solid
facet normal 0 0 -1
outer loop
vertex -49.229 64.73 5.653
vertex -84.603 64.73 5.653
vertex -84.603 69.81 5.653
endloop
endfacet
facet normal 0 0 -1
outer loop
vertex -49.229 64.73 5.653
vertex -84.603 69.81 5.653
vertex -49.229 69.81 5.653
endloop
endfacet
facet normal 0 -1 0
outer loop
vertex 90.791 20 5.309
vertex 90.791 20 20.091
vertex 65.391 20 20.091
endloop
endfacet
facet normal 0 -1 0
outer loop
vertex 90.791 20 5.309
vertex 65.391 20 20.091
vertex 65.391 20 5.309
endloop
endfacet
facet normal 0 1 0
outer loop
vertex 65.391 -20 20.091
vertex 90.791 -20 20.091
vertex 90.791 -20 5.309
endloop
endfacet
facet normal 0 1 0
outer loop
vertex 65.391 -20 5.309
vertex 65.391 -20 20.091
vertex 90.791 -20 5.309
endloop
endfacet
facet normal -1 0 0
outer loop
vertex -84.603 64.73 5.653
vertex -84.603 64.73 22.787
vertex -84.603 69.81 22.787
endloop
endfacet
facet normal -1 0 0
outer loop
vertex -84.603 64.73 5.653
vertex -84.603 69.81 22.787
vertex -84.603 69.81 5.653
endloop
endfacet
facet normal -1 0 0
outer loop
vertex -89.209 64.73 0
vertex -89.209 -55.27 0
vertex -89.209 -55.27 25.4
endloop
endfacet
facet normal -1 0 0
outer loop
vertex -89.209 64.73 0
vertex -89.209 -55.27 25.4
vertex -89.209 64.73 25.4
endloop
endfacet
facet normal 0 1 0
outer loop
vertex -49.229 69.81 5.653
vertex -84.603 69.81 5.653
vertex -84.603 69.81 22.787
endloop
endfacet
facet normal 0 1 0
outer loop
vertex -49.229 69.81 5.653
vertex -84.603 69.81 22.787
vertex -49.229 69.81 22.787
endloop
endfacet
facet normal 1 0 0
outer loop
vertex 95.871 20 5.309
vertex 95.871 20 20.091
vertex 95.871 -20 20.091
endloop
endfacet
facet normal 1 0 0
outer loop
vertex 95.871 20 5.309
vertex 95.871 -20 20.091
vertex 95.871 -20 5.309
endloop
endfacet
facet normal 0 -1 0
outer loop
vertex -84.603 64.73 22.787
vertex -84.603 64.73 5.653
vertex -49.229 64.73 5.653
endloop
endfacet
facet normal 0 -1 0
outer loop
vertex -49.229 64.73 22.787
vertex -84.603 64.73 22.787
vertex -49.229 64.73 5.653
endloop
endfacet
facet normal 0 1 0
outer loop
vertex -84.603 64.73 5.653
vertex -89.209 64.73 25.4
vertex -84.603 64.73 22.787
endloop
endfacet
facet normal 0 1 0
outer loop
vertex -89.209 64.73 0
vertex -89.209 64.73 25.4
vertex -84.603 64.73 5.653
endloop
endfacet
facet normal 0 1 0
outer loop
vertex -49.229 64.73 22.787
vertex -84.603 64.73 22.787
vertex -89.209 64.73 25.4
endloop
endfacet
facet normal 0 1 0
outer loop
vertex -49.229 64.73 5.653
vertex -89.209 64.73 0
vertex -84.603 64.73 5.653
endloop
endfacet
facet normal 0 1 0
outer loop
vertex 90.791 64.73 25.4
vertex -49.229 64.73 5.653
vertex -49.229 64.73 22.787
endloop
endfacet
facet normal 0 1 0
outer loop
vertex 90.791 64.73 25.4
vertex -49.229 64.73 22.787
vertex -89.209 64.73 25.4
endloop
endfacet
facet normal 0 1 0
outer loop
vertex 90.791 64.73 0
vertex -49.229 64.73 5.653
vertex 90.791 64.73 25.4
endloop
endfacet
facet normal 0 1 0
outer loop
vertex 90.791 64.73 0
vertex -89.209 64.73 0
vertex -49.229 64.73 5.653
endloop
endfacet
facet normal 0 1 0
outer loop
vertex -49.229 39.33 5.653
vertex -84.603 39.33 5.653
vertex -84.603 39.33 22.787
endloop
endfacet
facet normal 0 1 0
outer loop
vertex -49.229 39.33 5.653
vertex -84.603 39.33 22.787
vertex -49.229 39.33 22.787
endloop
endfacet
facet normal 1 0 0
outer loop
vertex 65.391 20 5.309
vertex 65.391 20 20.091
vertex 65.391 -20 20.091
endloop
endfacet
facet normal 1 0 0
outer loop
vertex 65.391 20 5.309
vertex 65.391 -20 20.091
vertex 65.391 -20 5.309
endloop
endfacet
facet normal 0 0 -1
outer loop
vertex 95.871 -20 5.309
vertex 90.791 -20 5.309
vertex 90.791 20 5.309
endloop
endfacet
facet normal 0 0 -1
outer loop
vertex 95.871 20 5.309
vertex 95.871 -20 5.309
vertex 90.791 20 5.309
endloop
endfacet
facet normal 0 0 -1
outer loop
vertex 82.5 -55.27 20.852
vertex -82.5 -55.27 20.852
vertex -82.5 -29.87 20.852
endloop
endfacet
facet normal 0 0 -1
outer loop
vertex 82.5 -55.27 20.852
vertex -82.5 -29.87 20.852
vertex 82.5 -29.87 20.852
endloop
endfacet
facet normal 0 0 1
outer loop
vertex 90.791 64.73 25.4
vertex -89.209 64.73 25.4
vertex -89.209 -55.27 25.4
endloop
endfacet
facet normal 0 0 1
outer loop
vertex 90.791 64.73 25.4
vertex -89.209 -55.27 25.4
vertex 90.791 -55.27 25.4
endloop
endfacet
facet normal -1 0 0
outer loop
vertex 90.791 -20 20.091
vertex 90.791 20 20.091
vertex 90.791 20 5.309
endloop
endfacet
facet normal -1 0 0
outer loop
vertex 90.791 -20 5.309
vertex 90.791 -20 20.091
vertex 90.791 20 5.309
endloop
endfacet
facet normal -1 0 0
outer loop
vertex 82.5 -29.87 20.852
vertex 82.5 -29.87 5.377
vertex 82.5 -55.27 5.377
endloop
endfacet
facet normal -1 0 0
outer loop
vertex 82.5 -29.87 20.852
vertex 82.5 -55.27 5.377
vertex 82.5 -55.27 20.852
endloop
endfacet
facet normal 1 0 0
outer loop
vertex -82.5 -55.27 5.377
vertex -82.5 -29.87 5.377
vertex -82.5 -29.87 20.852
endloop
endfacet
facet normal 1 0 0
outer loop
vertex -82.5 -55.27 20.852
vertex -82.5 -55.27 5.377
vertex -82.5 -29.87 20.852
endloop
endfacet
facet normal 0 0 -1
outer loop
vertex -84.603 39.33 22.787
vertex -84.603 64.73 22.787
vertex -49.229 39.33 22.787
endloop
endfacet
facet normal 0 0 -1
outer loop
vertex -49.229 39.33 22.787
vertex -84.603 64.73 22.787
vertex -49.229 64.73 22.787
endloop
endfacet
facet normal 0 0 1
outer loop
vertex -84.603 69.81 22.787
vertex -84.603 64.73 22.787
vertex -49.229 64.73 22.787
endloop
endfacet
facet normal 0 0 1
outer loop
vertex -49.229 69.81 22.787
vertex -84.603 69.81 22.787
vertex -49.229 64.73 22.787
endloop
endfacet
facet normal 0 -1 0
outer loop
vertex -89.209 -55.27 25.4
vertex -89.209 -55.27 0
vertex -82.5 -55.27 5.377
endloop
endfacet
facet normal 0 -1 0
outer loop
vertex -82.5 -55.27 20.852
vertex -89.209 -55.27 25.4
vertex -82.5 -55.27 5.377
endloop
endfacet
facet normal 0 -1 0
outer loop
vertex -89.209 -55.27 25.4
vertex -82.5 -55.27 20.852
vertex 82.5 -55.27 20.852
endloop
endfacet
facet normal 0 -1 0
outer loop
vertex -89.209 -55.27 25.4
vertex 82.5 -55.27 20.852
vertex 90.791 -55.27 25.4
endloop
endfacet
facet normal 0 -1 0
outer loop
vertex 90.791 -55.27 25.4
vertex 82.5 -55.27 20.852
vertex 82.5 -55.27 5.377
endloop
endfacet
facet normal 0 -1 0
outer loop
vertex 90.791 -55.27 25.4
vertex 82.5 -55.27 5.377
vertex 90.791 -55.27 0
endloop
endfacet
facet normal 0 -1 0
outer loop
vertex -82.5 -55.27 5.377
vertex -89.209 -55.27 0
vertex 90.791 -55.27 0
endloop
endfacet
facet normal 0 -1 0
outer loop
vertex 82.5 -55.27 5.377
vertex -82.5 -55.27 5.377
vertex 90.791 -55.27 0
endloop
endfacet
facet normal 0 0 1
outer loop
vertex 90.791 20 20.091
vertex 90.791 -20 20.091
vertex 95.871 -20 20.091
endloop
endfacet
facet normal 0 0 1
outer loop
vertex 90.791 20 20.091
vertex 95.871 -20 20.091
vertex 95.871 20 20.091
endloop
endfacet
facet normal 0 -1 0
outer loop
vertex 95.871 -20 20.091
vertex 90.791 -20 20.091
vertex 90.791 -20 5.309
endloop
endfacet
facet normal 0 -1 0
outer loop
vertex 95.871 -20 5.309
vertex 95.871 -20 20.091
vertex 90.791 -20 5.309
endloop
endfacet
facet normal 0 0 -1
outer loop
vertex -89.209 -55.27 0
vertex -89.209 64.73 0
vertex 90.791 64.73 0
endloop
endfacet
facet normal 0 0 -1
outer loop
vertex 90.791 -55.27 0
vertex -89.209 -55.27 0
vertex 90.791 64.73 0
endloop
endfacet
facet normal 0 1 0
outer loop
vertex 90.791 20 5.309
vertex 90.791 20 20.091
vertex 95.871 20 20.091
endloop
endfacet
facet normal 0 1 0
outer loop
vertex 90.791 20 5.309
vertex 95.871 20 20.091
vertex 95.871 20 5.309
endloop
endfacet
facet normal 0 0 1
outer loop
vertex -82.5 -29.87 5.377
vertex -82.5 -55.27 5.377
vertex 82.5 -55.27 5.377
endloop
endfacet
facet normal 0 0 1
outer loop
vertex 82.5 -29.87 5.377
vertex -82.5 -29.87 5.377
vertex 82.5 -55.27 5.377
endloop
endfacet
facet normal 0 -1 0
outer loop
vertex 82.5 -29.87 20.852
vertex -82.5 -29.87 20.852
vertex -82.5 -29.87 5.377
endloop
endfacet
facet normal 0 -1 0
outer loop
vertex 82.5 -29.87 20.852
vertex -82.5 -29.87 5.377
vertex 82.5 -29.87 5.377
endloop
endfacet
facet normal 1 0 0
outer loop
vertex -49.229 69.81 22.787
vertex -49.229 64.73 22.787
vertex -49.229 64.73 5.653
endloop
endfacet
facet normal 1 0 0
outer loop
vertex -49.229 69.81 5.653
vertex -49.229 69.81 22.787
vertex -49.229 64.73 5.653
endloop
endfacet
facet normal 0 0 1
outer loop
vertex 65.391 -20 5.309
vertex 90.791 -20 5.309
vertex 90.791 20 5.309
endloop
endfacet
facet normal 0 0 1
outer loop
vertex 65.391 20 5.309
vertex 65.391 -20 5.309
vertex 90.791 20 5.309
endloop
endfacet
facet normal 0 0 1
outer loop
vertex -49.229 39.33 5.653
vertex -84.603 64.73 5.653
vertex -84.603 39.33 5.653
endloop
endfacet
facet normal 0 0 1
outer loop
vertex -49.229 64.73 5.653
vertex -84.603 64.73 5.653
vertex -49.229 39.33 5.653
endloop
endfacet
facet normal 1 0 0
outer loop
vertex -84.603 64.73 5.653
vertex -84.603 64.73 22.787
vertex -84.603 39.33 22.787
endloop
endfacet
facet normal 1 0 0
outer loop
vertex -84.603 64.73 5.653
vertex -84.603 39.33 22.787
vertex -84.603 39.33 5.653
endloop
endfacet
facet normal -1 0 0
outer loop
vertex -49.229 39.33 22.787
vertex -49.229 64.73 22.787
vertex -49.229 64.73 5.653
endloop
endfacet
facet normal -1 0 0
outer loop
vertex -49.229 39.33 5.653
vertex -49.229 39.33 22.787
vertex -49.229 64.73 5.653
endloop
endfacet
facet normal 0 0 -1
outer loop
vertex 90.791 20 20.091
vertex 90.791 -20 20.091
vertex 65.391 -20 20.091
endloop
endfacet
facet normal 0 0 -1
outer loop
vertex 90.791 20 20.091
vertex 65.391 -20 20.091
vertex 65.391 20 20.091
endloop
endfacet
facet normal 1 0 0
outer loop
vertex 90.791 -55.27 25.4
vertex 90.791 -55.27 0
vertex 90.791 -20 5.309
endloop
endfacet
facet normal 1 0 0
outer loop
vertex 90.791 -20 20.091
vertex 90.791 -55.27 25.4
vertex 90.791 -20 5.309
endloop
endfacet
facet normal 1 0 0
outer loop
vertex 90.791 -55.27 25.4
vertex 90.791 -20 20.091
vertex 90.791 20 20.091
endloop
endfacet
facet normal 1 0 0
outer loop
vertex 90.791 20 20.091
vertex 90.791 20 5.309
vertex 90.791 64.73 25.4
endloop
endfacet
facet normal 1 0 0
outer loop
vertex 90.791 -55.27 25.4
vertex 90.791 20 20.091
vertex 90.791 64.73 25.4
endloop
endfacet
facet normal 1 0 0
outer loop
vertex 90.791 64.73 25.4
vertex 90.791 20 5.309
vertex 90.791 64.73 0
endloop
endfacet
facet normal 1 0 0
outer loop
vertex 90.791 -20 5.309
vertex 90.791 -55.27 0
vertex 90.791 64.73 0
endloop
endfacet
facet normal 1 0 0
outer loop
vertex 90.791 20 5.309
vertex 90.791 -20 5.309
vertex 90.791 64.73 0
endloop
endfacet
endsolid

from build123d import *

# Parameters (mm, degrees)
SKETCH1_W           = 180
SKETCH1_H           = 120
BOSS_EXTRUDE2_DEPTH = 25.4
SKETCH2_W           = 165
SKETCH2_H           = 15.47592275
CUT_EXTRUDE2_DEPTH  = 25.4
SKETCH3_W           = 35.373537715
SKETCH3_H           = 17.134057331
CUT_EXTRUDE3_DEPTH  = 25.4
SKETCH4_W           = 14.782323972
SKETCH4_H           = 40
CUT_EXTRUDE4_DEPTH  = 25.4
SKETCH3_2_W         = 35.373537715
SKETCH3_2_H         = 17.134057331
BOSS_EXTRUDE3_DEPTH = 5.08
SKETCH4_2_W         = 14.782323972
SKETCH4_2_H         = 40
BOSS_EXTRUDE4_DEPTH = 5.08


with BuildPart() as part:
    # Sketch1 → Boss-Extrude2 (new body)
    with BuildSketch(Plane.XY):
        with Locations((0.791140914, 4.730009408)):
            Rectangle(SKETCH1_W, SKETCH1_H)
    extrude(amount=BOSS_EXTRUDE2_DEPTH)

    # Sketch2 → Cut-Extrude2 (cut)
    with BuildSketch(Plane.XZ.offset(55.269990592)):
        with Locations((0, 13.114533645)):
            Rectangle(SKETCH2_W, SKETCH2_H)
    extrude(amount=-CUT_EXTRUDE2_DEPTH, mode=Mode.SUBTRACT)

    # Sketch3 → Cut-Extrude3 (cut)
    with BuildSketch(Plane(origin=(0, 64.730009408, 0), x_dir=(1, 0, 0), z_dir=(0, 1, 0))):
        with Locations((-66.916021118, -14.219956699)):
            Rectangle(SKETCH3_W, SKETCH3_H)
    extrude(amount=-CUT_EXTRUDE3_DEPTH, mode=Mode.SUBTRACT)

    # Sketch4 → Cut-Extrude4 (cut)
    with BuildSketch(Plane(origin=(90.791140914, 0, 0), x_dir=(0, 0, -1), z_dir=(1, 0, 0))):
        with Locations((-12.7, 0)):
            Rectangle(SKETCH4_W, SKETCH4_H)
    extrude(amount=-CUT_EXTRUDE4_DEPTH, mode=Mode.SUBTRACT)


with BuildPart() as body_2:
    # Sketch3<2> → Boss-Extrude3 (new body)
    with BuildSketch(Plane(origin=(0, 64.730009408, 0), x_dir=(1, 0, 0), z_dir=(0, 1, 0))):
        with Locations((-66.916021118, -14.219956699)):
            Rectangle(SKETCH3_2_W, SKETCH3_2_H)
    extrude(amount=BOSS_EXTRUDE3_DEPTH)


with BuildPart() as body_3:
    # Sketch4<2> → Boss-Extrude4 (new body)
    with BuildSketch(Plane(origin=(90.791140914, 0, 0), x_dir=(0, 0, -1), z_dir=(1, 0, 0))):
        with Locations((-12.7, 0)):
            Rectangle(SKETCH4_2_W, SKETCH4_2_H)
    extrude(amount=BOSS_EXTRUDE4_DEPTH)


solid = Compound([part.part, body_2.part, body_3.part])
